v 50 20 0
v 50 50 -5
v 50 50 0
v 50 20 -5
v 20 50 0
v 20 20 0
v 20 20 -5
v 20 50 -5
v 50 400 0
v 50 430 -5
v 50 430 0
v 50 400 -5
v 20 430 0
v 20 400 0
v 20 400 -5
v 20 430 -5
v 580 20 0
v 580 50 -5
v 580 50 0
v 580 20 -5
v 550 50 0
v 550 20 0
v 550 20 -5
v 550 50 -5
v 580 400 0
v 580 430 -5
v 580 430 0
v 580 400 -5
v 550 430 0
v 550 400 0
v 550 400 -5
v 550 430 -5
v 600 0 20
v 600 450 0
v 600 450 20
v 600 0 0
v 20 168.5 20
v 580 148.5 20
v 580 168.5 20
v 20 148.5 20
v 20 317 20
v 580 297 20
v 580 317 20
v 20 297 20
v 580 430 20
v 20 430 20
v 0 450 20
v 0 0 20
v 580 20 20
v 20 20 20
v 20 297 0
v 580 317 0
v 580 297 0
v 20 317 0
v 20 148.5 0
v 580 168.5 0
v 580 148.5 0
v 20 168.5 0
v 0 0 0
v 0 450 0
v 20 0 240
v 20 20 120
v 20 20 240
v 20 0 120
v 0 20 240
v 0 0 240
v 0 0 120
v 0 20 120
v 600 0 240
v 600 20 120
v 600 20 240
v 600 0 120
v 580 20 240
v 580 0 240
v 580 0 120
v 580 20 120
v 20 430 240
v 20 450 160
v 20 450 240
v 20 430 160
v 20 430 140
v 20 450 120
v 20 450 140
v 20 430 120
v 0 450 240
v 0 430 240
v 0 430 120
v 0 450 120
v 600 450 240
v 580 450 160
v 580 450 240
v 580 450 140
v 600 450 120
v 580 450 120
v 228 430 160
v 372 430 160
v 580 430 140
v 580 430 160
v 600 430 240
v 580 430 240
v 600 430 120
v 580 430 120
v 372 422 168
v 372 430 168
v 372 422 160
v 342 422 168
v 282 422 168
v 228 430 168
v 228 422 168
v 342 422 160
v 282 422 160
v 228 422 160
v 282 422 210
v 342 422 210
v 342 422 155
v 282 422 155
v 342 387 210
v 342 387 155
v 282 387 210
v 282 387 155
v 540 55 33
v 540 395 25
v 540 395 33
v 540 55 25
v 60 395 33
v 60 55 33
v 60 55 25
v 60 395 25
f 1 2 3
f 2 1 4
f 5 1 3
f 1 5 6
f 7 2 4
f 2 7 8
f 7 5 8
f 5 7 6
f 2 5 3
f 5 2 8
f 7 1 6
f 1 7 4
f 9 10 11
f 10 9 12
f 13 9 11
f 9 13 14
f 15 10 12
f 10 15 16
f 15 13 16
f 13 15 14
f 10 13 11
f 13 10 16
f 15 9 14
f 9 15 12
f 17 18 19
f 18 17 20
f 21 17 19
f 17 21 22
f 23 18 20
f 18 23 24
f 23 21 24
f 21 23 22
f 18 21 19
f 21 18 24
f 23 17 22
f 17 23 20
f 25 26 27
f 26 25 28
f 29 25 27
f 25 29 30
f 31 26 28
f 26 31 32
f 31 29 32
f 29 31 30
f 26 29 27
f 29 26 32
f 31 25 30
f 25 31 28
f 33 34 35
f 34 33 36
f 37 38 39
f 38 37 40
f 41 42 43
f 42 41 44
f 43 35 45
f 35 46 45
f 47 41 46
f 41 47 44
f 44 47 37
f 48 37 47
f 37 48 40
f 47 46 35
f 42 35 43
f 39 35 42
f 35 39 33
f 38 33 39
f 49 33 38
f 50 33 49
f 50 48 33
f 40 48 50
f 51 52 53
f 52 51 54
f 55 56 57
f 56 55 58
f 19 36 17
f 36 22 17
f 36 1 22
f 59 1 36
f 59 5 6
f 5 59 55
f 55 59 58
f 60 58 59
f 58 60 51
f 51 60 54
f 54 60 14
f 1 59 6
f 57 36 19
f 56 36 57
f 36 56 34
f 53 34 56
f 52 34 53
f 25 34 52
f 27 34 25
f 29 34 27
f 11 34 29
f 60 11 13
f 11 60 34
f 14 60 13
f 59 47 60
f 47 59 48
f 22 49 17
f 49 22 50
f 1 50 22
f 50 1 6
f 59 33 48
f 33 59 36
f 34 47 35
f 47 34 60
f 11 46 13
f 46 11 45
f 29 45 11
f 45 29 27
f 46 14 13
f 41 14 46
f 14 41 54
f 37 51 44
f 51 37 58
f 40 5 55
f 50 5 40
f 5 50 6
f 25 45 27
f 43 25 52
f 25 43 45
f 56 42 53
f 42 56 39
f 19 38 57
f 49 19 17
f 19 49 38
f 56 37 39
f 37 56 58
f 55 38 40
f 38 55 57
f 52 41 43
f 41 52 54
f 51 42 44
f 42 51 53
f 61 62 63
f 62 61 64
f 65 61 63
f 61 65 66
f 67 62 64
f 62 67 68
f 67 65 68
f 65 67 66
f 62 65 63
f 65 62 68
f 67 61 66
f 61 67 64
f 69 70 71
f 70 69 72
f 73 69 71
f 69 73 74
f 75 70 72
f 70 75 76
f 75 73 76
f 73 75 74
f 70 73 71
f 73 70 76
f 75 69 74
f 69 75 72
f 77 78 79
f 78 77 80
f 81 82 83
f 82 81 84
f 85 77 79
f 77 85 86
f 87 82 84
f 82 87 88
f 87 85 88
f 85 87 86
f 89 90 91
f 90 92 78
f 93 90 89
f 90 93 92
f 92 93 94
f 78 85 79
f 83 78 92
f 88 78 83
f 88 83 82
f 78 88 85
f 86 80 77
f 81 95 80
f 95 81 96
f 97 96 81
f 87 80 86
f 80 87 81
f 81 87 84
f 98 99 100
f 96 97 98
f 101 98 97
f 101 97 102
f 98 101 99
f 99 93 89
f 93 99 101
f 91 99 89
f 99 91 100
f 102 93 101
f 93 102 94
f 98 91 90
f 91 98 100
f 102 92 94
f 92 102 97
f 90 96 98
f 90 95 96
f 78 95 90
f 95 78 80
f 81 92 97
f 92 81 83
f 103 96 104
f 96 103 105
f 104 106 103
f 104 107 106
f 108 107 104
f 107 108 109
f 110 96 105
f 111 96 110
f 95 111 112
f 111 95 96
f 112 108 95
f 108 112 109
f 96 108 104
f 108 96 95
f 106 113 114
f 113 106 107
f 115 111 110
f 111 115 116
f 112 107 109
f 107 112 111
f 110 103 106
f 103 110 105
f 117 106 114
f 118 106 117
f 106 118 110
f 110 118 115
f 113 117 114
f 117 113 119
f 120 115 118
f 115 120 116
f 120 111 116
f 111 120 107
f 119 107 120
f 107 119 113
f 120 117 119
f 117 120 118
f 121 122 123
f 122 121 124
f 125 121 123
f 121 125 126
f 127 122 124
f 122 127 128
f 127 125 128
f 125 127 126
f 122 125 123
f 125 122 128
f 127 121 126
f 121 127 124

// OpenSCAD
/*
  CNC GANTRY FRAME – CONCEPTUAL REFERENCE MODEL
  Prepared as a portfolio learning artefact, NOT as a reproduction of the
  applicant's original final-year machine and NOT a fabrication-ready design.

  Dimensions are illustrative. Validate loads, stiffness, fasteners, tolerances,
  motor mounts, bearing supports, guarding, and machine safety before fabrication.
  Open with OpenSCAD; use F6 to render and File > Export > Export as STL.
*/
$fn = 32;

// Illustrative overall dimensions (mm)
frame_x = 600;
frame_y = 450;
frame_z = 120;
rail_w  = 20;
rail_h  = 20;
plate_t = 8;

module beam_x(x,y,z,len,w,h) {
    translate([x,y,z]) cube([len,w,h], center=false);
}
module beam_y(x,y,z,w,len,h) {
    translate([x,y,z]) cube([w,len,h], center=false);
}
module plate(x,y,z,l,w,t) {
    translate([x,y,z]) cube([l,w,t], center=false);
}

// Base perimeter and two cross-members
beam_x(0,0,0,frame_x,rail_w,rail_h);
beam_x(0,frame_y-rail_w,0,frame_x,rail_w,rail_h);
beam_y(0,rail_w,0,rail_w,frame_y-2*rail_w,rail_h);
beam_y(frame_x-rail_w,rail_w,0,rail_w,frame_y-2*rail_w,rail_h);
beam_x(rail_w,frame_y*0.33,0,frame_x-2*rail_w,rail_w,rail_h);
beam_x(rail_w,frame_y*0.66,0,frame_x-2*rail_w,rail_w,rail_h);

// Uprights and top cross-beam (conceptual gantry)
beam_z1 = frame_z;
beam_z2 = frame_z + rail_h;
beam_x(0,0,beam_z1,rail_w,rail_w,beam_z1);
beam_x(frame_x-rail_w,0,beam_z1,rail_w,rail_w,beam_z1);
beam_x(0,frame_y-rail_w,beam_z1,rail_w,rail_w,beam_z1);
beam_x(frame_x-rail_w,frame_y-rail_w,beam_z1,rail_w,rail_w,beam_z1);
beam_x(0,frame_y-rail_w,beam_z2,frame_x,rail_w,rail_h);

// Illustrative gantry carriage plate and toolhead block
plate(frame_x*0.38, frame_y-rail_w-plate_t, beam_z2+rail_h,
      frame_x*0.24, plate_t, plate_t);
translate([frame_x*0.47, frame_y-rail_w-plate_t-35, beam_z2+rail_h-5])
    cube([60,35,55], center=false);

// Work-bed plate (shown raised slightly above base members)
plate(60,55,rail_h+5,frame_x-120,frame_y-110,plate_t);

// Simple mounting-foot pads
for (x=[20,frame_x-50])
  for (y=[20,frame_y-50])
    translate([x,y,-5]) cube([30,30,5],center=false);
